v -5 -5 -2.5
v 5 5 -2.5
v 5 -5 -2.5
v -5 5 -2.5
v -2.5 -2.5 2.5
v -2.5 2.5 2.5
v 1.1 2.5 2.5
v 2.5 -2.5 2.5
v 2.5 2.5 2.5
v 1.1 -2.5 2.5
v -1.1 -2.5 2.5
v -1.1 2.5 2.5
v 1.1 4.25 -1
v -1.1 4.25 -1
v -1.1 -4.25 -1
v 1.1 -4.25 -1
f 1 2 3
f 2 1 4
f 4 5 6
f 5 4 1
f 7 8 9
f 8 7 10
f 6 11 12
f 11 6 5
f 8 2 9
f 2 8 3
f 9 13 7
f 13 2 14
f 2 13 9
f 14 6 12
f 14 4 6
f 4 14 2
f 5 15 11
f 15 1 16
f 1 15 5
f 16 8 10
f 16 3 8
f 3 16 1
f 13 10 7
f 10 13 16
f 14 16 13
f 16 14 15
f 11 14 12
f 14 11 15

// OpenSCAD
difference() {
    linear_extrude(height = 5, center = true, convexity = 10, scale=.5)
    translate([0, 0, 0])
    square([10,10], center=true);

    translate([0,0,4])
    cube( [2.2, 20, 10], center=true);
}
// circle(r = 1, center=true);
